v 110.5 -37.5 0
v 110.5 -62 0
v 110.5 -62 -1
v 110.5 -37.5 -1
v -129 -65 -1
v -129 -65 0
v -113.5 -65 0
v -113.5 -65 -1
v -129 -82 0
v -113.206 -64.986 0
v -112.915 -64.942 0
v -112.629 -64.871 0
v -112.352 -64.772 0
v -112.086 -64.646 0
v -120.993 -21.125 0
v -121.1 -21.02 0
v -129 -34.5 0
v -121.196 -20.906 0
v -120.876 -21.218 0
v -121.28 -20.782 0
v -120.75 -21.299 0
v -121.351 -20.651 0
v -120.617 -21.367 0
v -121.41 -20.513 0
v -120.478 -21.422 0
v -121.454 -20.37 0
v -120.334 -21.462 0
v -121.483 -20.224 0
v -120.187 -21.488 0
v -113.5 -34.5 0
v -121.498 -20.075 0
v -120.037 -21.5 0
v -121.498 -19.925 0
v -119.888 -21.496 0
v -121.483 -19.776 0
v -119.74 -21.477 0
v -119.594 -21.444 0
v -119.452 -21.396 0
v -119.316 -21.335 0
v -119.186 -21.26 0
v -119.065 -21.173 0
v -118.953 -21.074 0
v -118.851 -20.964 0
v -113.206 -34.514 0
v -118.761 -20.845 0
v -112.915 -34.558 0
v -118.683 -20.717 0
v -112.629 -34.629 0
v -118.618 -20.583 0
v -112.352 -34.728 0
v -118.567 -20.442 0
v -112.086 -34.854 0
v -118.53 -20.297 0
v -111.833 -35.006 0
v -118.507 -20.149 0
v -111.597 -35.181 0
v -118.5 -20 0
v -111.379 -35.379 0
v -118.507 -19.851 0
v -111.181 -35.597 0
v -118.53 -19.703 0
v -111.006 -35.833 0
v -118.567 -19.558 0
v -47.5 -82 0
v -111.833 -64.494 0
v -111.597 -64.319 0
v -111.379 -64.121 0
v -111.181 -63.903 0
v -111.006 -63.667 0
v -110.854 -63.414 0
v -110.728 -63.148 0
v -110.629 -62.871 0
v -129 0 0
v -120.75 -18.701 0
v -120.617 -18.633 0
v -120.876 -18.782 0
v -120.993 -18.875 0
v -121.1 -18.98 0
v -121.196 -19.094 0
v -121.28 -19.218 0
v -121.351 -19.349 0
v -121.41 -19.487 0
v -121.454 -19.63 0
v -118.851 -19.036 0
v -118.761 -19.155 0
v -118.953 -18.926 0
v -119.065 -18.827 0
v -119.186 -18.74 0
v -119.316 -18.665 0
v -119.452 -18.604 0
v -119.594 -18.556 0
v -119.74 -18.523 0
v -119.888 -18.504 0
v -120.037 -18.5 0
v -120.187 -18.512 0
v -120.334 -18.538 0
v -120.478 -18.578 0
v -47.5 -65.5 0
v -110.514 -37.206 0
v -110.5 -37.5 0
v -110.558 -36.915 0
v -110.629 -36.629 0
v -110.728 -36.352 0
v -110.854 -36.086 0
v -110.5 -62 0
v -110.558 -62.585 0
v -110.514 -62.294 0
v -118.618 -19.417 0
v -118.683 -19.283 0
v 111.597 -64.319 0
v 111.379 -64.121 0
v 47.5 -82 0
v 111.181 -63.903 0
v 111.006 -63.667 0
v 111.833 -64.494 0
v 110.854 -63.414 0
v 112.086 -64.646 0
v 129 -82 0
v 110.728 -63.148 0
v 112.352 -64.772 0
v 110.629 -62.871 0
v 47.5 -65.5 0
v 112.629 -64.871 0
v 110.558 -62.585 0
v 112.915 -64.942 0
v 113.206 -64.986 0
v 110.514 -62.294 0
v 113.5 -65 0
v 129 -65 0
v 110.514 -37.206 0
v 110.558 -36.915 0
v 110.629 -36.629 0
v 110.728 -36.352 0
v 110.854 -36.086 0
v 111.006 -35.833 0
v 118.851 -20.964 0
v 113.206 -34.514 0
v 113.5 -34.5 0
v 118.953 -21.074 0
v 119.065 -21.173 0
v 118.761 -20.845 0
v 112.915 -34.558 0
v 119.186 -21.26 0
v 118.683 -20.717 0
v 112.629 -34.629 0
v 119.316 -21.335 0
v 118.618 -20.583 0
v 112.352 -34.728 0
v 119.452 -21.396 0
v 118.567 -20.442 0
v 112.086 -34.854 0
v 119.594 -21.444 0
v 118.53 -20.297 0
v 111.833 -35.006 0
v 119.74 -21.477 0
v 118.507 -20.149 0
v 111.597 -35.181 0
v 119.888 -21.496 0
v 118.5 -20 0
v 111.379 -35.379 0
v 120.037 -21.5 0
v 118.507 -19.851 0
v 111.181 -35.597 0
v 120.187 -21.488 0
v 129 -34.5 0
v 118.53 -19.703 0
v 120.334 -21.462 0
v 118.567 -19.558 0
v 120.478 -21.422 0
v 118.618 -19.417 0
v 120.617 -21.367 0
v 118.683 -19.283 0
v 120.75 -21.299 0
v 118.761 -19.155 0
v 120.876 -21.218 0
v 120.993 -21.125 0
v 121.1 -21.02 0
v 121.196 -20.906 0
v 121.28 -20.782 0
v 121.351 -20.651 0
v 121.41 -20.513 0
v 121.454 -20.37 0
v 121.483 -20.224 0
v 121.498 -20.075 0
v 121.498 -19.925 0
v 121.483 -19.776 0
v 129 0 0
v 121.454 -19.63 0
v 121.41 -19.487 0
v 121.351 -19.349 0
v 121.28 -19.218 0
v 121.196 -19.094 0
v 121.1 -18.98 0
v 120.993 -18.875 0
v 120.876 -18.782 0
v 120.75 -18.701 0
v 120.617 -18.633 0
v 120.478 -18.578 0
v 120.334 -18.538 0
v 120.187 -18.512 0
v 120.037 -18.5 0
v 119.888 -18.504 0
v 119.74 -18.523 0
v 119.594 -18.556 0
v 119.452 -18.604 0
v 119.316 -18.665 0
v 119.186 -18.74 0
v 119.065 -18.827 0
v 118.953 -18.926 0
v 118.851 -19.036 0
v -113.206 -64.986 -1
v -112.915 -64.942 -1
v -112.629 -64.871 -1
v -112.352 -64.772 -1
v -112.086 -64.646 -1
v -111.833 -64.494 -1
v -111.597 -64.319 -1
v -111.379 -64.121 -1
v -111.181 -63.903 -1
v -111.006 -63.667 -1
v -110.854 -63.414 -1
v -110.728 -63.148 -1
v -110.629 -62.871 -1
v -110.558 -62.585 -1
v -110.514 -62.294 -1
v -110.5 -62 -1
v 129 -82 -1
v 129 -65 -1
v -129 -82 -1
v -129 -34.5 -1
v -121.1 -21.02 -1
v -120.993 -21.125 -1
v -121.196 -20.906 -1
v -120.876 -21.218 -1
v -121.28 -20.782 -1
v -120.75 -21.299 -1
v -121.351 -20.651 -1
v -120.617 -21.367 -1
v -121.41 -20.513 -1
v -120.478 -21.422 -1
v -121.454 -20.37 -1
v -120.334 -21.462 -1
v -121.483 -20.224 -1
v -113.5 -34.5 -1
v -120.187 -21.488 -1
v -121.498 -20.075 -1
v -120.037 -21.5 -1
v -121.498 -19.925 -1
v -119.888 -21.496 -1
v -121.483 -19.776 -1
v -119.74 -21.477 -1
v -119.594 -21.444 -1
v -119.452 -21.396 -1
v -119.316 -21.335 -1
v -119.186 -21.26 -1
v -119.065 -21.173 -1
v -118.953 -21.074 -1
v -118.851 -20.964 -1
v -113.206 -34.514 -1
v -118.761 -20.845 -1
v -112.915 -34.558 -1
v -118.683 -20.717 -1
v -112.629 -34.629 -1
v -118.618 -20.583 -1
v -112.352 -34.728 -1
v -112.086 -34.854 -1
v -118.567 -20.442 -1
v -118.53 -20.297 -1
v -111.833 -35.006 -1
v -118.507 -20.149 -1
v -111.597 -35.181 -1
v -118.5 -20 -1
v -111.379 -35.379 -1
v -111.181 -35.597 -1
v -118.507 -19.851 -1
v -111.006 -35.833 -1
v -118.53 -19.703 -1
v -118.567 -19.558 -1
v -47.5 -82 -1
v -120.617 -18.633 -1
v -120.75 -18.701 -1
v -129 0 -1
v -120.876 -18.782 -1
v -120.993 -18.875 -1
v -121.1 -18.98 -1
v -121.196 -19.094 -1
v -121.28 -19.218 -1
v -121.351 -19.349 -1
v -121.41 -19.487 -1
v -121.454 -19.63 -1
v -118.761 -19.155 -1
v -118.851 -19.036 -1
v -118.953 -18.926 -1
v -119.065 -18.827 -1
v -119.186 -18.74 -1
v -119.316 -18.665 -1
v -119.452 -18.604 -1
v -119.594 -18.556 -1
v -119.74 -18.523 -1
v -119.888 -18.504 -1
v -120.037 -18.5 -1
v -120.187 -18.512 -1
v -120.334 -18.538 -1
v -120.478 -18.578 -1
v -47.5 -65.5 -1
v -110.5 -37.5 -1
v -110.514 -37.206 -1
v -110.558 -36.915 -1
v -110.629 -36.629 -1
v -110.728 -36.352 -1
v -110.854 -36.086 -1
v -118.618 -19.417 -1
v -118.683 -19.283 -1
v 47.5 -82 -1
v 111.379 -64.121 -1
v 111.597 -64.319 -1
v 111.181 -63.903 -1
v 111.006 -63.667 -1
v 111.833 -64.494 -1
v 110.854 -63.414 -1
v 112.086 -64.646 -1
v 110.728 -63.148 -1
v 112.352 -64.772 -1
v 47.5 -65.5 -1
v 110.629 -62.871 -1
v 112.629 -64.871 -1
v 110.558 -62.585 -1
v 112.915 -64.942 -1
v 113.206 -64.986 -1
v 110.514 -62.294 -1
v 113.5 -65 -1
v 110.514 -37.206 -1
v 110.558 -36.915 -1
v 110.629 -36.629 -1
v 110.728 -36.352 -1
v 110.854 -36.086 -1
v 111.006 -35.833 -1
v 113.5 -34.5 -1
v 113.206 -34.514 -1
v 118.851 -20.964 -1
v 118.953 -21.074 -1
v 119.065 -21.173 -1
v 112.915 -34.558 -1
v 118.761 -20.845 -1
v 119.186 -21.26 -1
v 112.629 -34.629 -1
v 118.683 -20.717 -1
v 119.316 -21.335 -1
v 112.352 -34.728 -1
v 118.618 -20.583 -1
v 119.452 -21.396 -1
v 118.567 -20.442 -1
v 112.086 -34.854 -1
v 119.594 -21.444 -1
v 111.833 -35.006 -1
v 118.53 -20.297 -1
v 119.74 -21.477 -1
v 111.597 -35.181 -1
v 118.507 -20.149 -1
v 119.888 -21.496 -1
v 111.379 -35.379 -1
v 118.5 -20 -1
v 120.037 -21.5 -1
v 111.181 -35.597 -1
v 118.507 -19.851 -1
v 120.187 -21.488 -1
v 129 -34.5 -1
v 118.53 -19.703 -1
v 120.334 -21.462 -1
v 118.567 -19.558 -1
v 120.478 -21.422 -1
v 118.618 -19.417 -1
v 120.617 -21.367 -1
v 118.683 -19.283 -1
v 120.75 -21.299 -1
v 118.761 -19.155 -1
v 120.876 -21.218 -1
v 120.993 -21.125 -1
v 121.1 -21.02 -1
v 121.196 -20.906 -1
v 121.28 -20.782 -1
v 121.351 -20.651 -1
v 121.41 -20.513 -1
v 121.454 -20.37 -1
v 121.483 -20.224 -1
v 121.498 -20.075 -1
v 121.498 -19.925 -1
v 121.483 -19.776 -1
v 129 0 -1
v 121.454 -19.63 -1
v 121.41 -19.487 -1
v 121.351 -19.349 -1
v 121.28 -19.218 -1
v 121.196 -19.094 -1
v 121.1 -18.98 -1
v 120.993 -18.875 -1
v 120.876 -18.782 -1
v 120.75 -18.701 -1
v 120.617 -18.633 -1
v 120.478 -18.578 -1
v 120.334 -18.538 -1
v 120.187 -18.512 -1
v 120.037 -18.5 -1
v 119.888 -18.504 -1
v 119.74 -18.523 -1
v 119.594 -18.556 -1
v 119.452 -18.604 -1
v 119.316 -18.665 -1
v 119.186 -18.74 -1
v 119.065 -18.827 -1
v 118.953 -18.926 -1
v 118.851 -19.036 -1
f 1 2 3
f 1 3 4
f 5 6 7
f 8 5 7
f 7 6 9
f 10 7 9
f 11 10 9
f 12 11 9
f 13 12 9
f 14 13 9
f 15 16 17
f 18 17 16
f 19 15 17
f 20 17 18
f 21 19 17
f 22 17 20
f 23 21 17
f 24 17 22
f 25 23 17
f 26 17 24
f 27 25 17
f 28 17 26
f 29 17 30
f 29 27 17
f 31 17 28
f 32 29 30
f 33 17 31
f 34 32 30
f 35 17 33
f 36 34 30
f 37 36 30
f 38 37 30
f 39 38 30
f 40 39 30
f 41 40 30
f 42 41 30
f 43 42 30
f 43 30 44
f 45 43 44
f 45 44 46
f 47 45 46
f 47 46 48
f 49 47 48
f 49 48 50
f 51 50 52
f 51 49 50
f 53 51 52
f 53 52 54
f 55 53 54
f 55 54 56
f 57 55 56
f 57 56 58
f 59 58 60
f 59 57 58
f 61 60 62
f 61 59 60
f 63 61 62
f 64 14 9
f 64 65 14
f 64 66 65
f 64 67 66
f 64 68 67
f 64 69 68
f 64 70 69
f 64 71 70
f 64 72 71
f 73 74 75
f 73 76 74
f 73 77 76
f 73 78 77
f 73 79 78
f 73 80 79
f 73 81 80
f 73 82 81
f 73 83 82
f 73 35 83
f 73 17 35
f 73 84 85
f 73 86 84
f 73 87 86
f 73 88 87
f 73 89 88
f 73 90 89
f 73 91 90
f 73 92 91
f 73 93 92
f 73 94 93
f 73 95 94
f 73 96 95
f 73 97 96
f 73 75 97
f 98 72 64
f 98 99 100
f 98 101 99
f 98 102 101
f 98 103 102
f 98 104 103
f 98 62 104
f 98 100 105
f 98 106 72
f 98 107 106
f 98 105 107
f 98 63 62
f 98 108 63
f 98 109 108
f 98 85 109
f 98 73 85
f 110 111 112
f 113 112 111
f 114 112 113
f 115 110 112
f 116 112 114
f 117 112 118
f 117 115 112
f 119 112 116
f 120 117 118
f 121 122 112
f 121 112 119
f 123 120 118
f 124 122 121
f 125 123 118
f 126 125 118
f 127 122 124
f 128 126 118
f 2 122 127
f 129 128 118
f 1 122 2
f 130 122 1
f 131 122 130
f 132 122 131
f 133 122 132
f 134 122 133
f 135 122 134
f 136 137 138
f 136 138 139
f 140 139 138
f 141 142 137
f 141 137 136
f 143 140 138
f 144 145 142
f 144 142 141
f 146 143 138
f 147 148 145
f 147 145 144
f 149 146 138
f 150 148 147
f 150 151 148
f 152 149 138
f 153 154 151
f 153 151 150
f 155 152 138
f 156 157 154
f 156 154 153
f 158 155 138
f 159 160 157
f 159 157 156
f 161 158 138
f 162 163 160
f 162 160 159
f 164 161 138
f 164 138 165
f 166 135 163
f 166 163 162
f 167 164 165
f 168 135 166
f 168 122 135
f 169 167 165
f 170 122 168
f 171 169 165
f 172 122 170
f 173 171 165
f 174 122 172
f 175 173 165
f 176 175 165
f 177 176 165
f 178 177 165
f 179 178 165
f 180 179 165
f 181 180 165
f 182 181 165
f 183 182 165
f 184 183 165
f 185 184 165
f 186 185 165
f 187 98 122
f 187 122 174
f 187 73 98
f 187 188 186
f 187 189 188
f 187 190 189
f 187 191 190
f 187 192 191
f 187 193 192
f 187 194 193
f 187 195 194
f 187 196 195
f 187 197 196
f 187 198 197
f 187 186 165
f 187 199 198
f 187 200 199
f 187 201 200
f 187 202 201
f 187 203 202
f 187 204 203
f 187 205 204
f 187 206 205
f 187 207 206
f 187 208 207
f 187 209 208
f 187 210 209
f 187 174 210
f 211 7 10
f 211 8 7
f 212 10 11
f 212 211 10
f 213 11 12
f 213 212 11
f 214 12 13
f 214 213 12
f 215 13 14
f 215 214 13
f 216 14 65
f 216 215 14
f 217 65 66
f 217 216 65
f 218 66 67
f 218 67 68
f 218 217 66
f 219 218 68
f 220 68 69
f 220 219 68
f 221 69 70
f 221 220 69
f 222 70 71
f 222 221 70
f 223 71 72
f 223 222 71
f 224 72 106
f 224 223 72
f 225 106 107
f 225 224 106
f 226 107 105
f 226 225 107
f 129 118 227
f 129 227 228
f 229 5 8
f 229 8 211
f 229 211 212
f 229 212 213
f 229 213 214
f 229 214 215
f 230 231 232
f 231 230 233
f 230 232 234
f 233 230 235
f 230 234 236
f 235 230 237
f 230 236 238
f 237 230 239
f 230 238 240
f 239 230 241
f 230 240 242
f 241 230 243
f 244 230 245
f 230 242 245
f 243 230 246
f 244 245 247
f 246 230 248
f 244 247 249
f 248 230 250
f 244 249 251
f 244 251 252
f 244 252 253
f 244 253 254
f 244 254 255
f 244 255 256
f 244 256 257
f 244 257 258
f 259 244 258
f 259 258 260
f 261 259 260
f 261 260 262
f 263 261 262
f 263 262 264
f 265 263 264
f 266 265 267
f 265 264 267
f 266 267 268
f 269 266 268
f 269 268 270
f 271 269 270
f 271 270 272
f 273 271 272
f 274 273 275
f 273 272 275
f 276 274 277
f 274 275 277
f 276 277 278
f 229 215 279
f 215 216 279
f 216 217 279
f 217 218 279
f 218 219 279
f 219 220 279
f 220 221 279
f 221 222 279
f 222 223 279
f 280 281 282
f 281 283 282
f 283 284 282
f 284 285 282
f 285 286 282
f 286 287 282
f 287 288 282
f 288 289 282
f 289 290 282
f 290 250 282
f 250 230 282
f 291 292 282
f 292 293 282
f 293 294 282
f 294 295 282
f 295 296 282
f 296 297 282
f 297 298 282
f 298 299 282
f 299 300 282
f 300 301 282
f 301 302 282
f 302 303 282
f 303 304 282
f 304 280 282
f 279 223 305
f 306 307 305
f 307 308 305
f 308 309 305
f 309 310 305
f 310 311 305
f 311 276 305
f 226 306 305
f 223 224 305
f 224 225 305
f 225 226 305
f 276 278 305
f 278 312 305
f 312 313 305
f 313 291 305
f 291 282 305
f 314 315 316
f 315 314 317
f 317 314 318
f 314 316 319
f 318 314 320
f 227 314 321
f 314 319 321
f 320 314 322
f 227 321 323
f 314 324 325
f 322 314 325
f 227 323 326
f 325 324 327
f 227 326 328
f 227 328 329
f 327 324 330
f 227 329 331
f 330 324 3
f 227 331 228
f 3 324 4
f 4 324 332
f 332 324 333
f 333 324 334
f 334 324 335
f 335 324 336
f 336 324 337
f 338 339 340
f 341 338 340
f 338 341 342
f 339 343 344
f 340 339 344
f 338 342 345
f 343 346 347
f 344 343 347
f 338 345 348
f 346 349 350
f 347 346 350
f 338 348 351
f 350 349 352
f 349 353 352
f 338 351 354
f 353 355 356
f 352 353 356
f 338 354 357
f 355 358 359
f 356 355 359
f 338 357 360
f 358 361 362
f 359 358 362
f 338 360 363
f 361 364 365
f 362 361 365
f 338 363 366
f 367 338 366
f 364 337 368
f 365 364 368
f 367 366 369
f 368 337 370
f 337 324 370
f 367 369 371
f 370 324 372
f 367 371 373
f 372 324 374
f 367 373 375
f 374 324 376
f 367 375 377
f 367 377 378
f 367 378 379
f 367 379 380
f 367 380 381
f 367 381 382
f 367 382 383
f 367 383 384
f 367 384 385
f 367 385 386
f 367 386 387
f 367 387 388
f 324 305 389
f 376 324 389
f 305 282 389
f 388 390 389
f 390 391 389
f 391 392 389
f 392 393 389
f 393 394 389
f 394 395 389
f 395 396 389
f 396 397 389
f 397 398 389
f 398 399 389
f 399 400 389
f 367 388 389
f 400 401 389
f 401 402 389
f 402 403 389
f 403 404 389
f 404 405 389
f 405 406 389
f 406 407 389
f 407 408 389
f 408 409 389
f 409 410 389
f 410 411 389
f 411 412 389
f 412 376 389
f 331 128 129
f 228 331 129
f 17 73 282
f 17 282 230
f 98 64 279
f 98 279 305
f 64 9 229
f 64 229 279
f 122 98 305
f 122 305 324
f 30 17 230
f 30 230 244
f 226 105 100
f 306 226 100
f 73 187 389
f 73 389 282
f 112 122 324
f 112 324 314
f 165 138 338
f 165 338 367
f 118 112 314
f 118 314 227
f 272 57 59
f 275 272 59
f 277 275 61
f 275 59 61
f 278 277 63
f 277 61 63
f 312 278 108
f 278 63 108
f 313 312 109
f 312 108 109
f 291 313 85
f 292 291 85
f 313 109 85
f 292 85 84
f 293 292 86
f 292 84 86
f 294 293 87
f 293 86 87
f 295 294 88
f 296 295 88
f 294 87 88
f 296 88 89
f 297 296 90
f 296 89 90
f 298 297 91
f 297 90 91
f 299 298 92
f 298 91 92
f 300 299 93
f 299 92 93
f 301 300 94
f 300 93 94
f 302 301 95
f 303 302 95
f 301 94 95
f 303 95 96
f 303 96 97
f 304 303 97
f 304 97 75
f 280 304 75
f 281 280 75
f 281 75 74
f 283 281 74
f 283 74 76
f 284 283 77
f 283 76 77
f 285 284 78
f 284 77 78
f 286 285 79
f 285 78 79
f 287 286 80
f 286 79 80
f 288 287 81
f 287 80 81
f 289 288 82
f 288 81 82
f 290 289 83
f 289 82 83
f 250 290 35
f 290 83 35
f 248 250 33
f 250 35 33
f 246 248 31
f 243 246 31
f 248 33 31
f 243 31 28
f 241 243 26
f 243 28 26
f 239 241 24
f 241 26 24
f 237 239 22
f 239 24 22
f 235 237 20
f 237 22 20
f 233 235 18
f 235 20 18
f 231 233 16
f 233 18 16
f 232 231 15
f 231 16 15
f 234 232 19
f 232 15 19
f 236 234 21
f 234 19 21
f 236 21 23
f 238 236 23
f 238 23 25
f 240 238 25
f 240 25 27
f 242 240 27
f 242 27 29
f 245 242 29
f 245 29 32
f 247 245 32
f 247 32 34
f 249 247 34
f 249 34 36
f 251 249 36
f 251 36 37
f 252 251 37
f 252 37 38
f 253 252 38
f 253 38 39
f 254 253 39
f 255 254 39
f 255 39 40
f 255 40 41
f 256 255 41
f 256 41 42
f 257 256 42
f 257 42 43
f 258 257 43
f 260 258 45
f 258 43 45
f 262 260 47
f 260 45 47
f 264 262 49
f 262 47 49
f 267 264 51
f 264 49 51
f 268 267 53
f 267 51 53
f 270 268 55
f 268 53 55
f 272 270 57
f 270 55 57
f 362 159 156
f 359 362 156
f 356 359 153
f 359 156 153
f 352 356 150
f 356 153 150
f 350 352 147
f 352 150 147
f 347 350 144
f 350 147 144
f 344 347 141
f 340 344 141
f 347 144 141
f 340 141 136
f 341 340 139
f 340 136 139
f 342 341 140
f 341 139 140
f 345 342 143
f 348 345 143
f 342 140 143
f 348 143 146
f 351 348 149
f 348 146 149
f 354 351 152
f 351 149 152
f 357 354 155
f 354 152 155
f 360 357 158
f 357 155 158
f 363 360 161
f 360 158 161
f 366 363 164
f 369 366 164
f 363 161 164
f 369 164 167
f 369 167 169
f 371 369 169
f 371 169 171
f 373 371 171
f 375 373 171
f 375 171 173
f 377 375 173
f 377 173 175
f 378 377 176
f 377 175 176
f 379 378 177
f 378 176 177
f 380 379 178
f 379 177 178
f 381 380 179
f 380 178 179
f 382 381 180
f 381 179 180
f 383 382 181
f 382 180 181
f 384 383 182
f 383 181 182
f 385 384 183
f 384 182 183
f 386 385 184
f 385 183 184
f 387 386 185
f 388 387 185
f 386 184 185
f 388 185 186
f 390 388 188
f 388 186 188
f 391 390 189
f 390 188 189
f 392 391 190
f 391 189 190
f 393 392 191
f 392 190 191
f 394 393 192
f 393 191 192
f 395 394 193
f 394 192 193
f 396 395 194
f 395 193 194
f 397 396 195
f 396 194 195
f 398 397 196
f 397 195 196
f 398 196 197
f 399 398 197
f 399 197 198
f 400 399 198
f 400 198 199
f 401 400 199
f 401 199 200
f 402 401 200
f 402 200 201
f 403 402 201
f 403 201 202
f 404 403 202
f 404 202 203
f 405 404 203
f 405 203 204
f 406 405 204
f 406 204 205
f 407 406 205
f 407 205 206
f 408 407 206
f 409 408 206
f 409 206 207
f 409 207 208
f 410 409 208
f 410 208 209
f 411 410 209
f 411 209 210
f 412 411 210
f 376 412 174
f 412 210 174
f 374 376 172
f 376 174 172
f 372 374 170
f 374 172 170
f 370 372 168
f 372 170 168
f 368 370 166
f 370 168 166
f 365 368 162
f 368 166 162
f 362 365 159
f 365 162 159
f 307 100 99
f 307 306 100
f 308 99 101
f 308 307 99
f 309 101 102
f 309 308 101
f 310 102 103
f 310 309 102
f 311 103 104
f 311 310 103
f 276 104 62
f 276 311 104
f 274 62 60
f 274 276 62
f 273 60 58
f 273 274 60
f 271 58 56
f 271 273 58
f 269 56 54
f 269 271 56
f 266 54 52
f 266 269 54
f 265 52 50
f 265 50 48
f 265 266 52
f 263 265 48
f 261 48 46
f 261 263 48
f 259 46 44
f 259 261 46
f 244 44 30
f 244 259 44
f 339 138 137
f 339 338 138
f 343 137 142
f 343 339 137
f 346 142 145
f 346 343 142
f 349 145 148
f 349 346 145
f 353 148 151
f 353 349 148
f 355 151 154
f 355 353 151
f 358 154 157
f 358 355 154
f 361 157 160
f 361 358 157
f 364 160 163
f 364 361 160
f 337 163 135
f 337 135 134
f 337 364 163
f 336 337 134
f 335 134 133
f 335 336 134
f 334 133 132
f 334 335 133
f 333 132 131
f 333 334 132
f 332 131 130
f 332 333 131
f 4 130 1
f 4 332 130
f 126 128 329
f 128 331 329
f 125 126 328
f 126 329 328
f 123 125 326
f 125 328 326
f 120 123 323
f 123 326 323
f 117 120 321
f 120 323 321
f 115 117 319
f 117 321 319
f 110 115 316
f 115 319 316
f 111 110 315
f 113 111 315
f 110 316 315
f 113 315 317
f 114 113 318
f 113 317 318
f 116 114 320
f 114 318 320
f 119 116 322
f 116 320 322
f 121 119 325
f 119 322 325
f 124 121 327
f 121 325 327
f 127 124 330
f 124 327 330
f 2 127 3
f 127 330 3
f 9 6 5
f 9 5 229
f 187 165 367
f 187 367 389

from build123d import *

# Parameters (mm, degrees)
T_LE_DE_BASE_PLI_E1_DEPTH = 1
ESQUISSE6_R               = 1.5
ESQUISSE6_W               = 18.5
ESQUISSE6_H               = 30.5
ENL_V_MAT_EXTRU_1_DEPTH   = 1
CONG_1_R                  = 3


# Sheet-metal steps are written as plain solids
with BuildPart() as part:
    # Esquisse1 → Tôle de base pliée1 (new body)
    with BuildSketch(Plane.XY):
        Polygon((47.5, -82), (129, -82), (129, 0), (-129, 0), (-129, -82), (-47.5, -82), (-47.5, -65.5), (47.5, -65.5), align=None)
    extrude(amount=-T_LE_DE_BASE_PLI_E1_DEPTH)

    # Esquisse6 → Enlèv. mat.-Extru.1 (cut)
    with BuildSketch(Plane.XY):
        with Locations((-120, -20)):
            Circle(ESQUISSE6_R)
        with Locations(Location((120, -20, 0), (0, 0, 180))):
            Circle(ESQUISSE6_R)
        with Locations((-119.75, -49.75)):
            Rectangle(ESQUISSE6_W, ESQUISSE6_H)
        with Locations((119.75, -49.75)):
            Rectangle(ESQUISSE6_W, ESQUISSE6_H)
    extrude(amount=-ENL_V_MAT_EXTRU_1_DEPTH, mode=Mode.SUBTRACT)

    # Congé1
    cong_1_edges = [part.edges().sort_by_distance(p)[0] for p in [
        (110.5, -65, -0.5),
        (110.5, -34.5, -0.5),
        (-110.5, -34.5, -0.5),
        (-110.5, -65, -0.5),
    ]]
    fillet(cong_1_edges, radius=CONG_1_R)


solid = part.part
